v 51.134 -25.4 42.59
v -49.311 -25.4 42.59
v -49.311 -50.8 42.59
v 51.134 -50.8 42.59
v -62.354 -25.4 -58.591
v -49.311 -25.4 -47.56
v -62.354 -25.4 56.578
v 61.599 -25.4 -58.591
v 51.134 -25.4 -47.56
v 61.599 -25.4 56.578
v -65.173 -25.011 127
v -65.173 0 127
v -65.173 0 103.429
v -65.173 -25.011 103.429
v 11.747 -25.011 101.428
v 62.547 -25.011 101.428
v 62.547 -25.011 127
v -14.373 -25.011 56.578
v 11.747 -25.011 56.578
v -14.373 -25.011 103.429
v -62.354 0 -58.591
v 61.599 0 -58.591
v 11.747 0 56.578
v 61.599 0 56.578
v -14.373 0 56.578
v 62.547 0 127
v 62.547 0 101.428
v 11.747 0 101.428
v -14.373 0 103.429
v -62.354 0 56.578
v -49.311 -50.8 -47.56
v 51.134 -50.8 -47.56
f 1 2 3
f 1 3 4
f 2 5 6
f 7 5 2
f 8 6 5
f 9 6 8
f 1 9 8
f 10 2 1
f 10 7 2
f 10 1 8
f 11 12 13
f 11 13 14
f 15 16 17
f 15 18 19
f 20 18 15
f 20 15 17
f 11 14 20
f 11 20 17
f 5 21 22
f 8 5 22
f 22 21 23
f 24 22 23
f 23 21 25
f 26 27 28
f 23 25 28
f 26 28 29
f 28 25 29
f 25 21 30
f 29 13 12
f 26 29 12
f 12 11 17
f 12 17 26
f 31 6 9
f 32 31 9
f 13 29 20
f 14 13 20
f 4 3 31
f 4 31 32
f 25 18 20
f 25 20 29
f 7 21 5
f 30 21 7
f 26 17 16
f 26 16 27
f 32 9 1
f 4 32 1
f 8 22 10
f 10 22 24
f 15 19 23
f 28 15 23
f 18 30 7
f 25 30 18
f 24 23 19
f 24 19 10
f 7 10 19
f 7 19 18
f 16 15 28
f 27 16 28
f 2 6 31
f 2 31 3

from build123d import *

# Parameters (mm, degrees)
F0_W     = 123.9526234567
F0_H     = 115.1683554053
F1_DEPTH = 25.4
F2_W     = 100.4445962608
F2_H     = 90.1500321925
F3_DEPTH = 50.8
F4_W     = 26.1205909774
F4_H     = 25.0108242035
F5_DEPTH = 127
F6_W     = 25.0108242035
F6_H     = 23.5706527233
F7_DEPTH = 50.8
F8_W     = 25.0108242035
F8_H     = 25.5720127821
F9_DEPTH = 50.8


with BuildPart() as f1:
    # F0 (on Front) → F1 (new body)
    with BuildSketch(Plane.XZ):
        with Locations((-0.3773439676, -1.0064095259)):
            Rectangle(F0_W, F0_H)
    extrude(amount=F1_DEPTH)

    # F2 (on Front) → F3 (join)
    with BuildSketch(Plane.XZ):
        with Locations((0.9114388376, -2.4853553623)):
            Rectangle(F2_W, F2_H)
    extrude(amount=F3_DEPTH)

    # F4 (on Top) → F5 (join)
    with BuildSketch(Plane.XY):
        with Locations((-1.3128877617, -12.5054121017)):
            Rectangle(F4_W, F4_H)
    extrude(amount=F5_DEPTH)

    # F6 (on face) → F7 (join)
    with BuildSketch(Plane(origin=(-14.3731832504, 0, 0), x_dir=(0, -1, 0), z_dir=(-1, 0, 0))):
        with Locations((12.5054121017, 115.2146736383)):
            Rectangle(F6_W, F6_H)
    extrude(amount=F7_DEPTH)

    # F8 (on face) → F9 (join)
    with BuildSketch(Plane.YZ.offset(11.7474077269)):
        with Locations((-12.5054121017, 114.213993609)):
            Rectangle(F8_W, F8_H)
    extrude(amount=F9_DEPTH)


solid = f1.part
